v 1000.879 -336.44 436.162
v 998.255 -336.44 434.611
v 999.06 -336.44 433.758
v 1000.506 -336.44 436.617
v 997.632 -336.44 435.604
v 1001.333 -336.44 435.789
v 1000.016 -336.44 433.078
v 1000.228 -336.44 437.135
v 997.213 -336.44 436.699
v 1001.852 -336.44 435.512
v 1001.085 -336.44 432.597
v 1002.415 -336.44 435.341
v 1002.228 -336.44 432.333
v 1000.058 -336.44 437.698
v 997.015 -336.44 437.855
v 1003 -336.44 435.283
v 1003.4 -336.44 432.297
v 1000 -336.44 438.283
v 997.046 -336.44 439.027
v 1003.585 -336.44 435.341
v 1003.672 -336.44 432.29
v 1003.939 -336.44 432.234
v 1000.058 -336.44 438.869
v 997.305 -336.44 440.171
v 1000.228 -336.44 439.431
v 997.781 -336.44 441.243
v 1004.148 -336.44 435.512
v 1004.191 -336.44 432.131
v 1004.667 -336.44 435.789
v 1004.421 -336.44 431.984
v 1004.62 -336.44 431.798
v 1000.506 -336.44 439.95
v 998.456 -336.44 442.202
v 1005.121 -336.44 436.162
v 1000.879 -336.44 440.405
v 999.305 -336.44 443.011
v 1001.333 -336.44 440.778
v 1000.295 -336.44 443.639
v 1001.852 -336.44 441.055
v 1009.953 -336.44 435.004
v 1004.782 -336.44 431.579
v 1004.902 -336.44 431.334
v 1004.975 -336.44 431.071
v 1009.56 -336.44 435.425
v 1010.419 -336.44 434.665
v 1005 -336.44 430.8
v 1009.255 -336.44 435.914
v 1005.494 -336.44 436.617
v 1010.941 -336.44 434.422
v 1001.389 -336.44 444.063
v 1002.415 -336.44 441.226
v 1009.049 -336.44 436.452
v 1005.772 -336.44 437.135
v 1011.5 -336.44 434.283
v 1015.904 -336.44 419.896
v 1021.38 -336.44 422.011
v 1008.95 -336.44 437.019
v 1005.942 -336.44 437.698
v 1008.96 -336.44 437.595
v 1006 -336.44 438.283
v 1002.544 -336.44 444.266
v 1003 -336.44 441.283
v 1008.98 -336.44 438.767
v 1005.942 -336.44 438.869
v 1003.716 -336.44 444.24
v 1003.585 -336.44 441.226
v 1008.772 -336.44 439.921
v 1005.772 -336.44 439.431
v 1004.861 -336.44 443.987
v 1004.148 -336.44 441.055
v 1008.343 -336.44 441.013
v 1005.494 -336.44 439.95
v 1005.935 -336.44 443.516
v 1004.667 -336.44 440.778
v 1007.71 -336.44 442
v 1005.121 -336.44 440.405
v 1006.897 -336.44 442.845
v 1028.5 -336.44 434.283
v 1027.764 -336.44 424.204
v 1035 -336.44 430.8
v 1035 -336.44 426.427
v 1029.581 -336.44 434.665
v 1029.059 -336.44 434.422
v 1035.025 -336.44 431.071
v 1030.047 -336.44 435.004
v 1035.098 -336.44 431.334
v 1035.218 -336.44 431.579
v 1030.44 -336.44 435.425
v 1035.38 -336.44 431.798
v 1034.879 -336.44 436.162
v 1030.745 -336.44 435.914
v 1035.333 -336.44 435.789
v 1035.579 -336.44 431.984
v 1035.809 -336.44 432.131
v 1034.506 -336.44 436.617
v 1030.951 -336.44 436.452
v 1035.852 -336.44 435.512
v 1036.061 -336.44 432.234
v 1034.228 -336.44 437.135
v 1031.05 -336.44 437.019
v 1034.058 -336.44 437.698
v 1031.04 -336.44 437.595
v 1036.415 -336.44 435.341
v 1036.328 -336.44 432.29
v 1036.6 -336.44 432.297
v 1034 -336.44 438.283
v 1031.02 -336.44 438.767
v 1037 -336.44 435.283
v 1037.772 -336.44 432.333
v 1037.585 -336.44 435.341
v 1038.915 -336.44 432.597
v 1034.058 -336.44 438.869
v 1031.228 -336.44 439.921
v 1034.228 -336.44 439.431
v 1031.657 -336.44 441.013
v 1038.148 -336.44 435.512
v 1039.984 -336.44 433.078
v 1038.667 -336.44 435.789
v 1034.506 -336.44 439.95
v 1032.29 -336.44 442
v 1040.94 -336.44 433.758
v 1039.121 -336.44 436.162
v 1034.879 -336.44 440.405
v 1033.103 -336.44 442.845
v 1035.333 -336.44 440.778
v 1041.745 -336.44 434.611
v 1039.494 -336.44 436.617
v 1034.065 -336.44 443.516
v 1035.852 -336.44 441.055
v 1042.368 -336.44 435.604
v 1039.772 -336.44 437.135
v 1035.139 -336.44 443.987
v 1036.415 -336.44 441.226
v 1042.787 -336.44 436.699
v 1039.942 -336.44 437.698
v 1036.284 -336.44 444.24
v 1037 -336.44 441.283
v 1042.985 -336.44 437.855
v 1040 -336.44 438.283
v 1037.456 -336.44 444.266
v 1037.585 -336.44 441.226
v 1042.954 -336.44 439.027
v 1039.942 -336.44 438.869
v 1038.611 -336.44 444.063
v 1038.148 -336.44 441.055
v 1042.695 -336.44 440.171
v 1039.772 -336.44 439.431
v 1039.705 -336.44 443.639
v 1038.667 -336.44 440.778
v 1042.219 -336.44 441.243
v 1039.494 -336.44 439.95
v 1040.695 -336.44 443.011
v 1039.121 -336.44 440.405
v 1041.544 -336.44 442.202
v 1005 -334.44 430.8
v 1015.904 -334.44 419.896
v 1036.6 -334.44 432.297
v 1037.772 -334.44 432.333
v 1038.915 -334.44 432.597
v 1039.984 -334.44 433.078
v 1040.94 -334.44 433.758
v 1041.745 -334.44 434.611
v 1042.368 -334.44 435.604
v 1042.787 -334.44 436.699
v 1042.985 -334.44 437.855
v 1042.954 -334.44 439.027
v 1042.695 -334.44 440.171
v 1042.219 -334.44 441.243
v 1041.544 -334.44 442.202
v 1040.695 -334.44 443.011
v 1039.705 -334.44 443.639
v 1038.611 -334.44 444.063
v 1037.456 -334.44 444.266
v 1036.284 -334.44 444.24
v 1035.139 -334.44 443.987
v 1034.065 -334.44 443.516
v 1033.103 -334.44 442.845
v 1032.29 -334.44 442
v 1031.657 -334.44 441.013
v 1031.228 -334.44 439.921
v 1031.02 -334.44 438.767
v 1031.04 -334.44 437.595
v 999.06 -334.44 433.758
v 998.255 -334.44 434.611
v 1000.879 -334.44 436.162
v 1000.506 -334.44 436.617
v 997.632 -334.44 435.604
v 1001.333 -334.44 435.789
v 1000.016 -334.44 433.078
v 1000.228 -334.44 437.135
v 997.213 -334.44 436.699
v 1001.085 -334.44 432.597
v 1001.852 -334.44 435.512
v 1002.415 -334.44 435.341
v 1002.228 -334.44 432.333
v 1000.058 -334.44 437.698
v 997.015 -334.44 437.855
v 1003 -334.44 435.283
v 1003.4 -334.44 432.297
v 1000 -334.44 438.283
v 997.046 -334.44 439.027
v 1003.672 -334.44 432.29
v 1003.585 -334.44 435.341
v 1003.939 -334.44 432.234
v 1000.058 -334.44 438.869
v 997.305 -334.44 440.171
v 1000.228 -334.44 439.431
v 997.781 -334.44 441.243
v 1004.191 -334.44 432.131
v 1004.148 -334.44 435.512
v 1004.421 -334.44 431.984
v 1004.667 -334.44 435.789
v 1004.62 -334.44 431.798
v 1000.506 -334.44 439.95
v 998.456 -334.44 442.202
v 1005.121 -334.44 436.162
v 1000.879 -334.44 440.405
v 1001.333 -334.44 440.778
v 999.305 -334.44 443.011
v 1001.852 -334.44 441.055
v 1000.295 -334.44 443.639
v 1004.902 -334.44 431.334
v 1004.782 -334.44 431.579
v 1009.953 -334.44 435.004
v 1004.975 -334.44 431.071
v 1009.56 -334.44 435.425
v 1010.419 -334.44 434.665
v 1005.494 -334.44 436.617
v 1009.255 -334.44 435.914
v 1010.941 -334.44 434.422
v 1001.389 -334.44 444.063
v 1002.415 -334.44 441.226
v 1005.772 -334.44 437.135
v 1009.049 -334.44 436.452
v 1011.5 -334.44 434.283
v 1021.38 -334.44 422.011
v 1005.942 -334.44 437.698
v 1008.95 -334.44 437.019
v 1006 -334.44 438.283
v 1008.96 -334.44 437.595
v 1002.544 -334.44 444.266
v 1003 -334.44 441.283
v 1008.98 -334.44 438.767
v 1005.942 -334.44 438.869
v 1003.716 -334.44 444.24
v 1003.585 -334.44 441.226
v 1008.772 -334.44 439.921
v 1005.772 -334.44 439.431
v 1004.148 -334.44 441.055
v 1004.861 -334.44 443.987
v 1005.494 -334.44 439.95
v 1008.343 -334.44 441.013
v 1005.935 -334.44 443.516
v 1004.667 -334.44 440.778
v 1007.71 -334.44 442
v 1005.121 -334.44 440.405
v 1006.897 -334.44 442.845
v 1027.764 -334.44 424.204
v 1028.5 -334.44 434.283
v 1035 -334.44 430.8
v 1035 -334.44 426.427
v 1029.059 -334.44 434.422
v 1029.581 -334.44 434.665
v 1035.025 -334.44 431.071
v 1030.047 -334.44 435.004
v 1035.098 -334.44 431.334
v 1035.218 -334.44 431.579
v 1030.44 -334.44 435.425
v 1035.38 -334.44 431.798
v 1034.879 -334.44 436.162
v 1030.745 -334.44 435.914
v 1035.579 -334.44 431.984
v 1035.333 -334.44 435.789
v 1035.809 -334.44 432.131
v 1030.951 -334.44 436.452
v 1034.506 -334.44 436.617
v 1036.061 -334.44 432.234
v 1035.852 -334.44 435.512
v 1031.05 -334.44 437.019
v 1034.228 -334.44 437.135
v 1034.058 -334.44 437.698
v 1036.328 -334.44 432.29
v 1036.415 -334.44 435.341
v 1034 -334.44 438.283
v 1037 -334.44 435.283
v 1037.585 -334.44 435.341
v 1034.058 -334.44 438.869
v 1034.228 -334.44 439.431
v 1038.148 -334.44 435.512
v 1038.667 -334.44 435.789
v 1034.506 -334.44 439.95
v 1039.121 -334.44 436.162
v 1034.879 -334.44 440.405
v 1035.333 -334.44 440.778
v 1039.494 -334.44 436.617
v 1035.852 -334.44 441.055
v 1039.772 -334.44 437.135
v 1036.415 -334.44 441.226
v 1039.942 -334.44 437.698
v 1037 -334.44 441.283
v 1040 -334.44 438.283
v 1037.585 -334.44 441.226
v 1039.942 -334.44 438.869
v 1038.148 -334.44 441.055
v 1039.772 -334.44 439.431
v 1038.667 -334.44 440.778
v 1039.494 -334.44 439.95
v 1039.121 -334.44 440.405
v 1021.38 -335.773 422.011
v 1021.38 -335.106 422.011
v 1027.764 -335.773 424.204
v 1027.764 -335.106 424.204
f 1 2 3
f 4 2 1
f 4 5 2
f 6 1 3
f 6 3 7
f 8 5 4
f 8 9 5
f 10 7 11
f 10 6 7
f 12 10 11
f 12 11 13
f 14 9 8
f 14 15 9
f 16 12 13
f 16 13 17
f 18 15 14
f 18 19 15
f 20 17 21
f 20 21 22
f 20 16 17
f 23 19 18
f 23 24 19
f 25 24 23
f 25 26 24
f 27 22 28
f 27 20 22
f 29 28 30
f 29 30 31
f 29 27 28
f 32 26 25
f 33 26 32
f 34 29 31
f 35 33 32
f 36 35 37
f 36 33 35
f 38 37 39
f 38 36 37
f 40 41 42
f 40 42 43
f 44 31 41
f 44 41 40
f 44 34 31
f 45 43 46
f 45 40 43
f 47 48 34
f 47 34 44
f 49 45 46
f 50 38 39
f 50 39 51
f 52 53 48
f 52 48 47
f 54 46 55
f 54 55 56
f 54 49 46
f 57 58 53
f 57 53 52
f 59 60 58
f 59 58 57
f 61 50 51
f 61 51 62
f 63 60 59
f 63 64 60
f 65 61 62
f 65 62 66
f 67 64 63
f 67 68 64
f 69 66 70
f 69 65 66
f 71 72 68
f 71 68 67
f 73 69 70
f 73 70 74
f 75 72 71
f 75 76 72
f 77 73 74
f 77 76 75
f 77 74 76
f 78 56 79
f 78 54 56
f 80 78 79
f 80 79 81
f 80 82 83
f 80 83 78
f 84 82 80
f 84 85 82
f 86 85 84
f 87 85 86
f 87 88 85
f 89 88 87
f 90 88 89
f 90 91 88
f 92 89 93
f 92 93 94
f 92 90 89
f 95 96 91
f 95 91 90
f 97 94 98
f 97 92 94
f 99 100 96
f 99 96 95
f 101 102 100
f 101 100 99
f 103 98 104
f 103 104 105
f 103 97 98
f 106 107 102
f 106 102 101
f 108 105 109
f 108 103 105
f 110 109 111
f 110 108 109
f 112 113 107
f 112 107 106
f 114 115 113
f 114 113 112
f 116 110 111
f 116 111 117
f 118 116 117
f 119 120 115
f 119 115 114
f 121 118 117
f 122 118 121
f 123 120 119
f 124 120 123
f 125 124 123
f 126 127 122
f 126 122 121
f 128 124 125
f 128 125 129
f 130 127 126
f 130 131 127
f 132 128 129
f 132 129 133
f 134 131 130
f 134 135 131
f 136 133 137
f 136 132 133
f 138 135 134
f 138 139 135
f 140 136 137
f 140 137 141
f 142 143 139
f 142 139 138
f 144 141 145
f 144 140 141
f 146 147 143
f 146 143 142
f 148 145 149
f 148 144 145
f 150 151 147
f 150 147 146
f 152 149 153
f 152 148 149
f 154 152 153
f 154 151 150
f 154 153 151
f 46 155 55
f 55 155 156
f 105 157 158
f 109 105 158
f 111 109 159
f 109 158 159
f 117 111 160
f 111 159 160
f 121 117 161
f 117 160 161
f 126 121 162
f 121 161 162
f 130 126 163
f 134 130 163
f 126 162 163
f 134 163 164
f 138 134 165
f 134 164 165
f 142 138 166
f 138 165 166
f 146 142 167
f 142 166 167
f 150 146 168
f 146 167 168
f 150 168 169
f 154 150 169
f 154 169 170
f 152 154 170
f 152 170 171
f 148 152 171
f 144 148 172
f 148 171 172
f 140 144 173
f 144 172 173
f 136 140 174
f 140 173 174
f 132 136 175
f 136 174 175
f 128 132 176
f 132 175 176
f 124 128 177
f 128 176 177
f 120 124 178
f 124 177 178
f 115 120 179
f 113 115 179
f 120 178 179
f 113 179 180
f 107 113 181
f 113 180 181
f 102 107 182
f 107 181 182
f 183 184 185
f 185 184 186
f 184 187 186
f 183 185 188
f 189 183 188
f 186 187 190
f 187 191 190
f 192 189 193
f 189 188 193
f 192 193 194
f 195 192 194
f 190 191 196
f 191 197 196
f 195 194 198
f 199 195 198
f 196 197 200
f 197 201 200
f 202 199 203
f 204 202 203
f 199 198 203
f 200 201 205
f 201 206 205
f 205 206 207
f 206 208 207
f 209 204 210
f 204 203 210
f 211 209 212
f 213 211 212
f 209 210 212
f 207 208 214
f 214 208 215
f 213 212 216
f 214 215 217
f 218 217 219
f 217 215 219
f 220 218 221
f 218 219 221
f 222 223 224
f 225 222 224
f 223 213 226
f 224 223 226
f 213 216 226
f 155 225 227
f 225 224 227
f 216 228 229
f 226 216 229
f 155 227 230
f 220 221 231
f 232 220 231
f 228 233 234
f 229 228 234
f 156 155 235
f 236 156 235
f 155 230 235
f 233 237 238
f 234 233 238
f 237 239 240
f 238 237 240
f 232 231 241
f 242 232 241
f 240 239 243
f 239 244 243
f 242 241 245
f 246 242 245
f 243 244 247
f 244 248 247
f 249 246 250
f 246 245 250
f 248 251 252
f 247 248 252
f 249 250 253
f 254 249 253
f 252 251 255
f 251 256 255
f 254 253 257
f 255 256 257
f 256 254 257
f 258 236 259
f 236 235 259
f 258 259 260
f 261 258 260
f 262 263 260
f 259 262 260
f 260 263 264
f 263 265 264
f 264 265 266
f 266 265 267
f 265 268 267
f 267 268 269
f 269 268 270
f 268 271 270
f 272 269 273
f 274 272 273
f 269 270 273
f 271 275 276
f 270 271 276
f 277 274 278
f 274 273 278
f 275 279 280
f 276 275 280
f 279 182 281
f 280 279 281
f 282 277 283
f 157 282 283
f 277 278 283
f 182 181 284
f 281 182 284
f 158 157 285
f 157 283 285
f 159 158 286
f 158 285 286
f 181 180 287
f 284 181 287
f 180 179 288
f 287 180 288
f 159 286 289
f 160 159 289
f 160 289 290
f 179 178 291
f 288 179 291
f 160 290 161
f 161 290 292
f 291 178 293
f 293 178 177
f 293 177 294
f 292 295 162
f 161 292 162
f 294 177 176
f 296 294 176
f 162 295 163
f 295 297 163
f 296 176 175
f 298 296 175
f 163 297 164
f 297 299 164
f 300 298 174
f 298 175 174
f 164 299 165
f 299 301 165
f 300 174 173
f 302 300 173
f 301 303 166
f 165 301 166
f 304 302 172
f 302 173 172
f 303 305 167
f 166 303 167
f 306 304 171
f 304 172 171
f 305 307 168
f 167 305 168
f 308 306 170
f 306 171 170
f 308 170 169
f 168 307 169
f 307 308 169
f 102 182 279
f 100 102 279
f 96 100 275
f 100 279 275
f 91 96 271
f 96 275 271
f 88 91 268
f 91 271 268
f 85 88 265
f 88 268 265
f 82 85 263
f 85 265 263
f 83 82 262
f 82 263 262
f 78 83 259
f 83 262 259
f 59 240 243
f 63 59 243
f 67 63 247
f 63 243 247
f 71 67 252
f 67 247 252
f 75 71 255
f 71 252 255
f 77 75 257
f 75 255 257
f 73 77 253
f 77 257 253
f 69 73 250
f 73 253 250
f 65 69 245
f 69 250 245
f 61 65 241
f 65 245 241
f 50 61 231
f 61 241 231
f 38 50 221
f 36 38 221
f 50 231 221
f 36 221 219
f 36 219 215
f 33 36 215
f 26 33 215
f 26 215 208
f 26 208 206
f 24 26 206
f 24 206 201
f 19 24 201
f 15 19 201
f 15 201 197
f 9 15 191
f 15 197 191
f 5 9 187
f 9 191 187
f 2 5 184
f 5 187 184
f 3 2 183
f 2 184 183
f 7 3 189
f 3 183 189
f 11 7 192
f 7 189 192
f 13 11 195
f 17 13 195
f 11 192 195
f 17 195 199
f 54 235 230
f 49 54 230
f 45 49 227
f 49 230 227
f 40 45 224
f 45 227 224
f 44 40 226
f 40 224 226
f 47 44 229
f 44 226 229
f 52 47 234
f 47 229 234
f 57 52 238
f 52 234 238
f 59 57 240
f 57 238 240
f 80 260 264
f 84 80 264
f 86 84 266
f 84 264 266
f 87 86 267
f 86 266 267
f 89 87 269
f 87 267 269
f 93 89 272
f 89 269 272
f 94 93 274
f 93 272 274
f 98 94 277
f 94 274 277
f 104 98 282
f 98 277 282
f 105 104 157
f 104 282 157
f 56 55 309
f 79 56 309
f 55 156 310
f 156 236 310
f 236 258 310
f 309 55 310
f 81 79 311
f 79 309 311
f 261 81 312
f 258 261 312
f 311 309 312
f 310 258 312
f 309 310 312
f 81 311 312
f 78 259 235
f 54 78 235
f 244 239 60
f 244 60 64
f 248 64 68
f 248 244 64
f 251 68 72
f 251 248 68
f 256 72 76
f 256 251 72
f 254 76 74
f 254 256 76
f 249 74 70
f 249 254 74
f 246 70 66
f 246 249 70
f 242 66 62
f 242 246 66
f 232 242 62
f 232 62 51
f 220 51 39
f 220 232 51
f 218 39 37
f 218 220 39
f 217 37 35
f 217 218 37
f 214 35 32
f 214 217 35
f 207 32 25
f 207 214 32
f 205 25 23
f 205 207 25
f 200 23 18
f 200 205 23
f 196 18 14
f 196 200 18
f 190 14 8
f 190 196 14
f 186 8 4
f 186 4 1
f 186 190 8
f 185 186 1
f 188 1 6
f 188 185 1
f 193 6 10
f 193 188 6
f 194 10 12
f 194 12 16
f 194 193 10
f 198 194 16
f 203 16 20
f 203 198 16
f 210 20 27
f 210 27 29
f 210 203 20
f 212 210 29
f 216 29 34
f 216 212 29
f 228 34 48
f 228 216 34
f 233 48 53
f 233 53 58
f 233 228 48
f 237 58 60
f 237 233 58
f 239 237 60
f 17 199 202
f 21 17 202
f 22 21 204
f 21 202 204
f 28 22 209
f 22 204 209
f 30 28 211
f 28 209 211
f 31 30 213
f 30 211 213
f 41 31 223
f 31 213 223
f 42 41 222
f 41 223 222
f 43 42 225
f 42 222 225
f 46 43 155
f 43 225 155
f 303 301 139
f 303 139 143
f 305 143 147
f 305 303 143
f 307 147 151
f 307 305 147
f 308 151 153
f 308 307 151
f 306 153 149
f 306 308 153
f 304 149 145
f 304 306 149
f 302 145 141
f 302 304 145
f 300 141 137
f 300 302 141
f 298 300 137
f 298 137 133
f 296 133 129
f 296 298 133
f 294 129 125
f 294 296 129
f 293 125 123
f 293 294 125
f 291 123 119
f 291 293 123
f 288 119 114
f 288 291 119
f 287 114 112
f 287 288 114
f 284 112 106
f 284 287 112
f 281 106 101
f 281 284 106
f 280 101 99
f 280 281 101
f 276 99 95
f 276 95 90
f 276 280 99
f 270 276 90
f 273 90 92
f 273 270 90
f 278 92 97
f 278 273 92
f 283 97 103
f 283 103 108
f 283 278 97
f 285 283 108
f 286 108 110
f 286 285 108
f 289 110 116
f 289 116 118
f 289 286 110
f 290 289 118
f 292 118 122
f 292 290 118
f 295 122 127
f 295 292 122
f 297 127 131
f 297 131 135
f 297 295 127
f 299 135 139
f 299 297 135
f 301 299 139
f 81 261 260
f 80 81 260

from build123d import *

# Parameters (mm, degrees)
SZKIC1_R                    = 3
DODANIE_WYCI_GNI_CIE1_DEPTH = 2


with BuildPart() as part:
    # Szkic1 → Dodanie-wyciągnięcie1 (new body)
    with BuildSketch(Plane.XZ.offset(334.439810961)):
        with BuildLine():
            ThreePointArc((1003.4, 432.296579888), (1004.524695077, 431.895362049), (1005, 430.799916934))
            Line((1005, 430.799916934), (1015.903797979, 419.896118954))
            add(Edge.make_bspline(
                [(1015.903797979, 419.896118954), (1021.185746723, 422.066519939), (1027.589044834, 424.271723988), (1035, 426.42724062)],
                knots=[0.141934854, 0.141934854, 0.141934854, 0.141934854, 0.193423322, 0.193423322, 0.193423322, 0.193423322], degree=3, weights=[0.593424606, 0.563749359, 0.541143612, 0.525607364]))
            Line((1035, 426.42724062), (1035, 430.799916934))
            ThreePointArc((1035, 430.799916934), (1035.475304923, 431.895362049), (1036.6, 432.296579888))
            ThreePointArc((1036.6, 432.296579888), (1041.13903563, 442.62700703), (1031.039616452, 437.59488008))
            ThreePointArc((1031.039616452, 437.59488008), (1030.440005619, 435.425099056), (1028.5, 434.283231707))
            Line((1028.5, 434.283231707), (1011.5, 434.283231707))
            ThreePointArc((1011.5, 434.283231707), (1009.559994381, 435.425099056), (1008.960383548, 437.59488008))
            ThreePointArc((1008.960383548, 437.59488008), (998.86096437, 442.62700703), (1003.4, 432.296579888))
        make_face()
        with Locations((1003, 438.283231707)):
            Circle(SZKIC1_R, mode=Mode.SUBTRACT)
        with Locations((1037, 438.283231707)):
            Circle(SZKIC1_R, mode=Mode.SUBTRACT)
    extrude(amount=DODANIE_WYCI_GNI_CIE1_DEPTH)


solid = part.part
